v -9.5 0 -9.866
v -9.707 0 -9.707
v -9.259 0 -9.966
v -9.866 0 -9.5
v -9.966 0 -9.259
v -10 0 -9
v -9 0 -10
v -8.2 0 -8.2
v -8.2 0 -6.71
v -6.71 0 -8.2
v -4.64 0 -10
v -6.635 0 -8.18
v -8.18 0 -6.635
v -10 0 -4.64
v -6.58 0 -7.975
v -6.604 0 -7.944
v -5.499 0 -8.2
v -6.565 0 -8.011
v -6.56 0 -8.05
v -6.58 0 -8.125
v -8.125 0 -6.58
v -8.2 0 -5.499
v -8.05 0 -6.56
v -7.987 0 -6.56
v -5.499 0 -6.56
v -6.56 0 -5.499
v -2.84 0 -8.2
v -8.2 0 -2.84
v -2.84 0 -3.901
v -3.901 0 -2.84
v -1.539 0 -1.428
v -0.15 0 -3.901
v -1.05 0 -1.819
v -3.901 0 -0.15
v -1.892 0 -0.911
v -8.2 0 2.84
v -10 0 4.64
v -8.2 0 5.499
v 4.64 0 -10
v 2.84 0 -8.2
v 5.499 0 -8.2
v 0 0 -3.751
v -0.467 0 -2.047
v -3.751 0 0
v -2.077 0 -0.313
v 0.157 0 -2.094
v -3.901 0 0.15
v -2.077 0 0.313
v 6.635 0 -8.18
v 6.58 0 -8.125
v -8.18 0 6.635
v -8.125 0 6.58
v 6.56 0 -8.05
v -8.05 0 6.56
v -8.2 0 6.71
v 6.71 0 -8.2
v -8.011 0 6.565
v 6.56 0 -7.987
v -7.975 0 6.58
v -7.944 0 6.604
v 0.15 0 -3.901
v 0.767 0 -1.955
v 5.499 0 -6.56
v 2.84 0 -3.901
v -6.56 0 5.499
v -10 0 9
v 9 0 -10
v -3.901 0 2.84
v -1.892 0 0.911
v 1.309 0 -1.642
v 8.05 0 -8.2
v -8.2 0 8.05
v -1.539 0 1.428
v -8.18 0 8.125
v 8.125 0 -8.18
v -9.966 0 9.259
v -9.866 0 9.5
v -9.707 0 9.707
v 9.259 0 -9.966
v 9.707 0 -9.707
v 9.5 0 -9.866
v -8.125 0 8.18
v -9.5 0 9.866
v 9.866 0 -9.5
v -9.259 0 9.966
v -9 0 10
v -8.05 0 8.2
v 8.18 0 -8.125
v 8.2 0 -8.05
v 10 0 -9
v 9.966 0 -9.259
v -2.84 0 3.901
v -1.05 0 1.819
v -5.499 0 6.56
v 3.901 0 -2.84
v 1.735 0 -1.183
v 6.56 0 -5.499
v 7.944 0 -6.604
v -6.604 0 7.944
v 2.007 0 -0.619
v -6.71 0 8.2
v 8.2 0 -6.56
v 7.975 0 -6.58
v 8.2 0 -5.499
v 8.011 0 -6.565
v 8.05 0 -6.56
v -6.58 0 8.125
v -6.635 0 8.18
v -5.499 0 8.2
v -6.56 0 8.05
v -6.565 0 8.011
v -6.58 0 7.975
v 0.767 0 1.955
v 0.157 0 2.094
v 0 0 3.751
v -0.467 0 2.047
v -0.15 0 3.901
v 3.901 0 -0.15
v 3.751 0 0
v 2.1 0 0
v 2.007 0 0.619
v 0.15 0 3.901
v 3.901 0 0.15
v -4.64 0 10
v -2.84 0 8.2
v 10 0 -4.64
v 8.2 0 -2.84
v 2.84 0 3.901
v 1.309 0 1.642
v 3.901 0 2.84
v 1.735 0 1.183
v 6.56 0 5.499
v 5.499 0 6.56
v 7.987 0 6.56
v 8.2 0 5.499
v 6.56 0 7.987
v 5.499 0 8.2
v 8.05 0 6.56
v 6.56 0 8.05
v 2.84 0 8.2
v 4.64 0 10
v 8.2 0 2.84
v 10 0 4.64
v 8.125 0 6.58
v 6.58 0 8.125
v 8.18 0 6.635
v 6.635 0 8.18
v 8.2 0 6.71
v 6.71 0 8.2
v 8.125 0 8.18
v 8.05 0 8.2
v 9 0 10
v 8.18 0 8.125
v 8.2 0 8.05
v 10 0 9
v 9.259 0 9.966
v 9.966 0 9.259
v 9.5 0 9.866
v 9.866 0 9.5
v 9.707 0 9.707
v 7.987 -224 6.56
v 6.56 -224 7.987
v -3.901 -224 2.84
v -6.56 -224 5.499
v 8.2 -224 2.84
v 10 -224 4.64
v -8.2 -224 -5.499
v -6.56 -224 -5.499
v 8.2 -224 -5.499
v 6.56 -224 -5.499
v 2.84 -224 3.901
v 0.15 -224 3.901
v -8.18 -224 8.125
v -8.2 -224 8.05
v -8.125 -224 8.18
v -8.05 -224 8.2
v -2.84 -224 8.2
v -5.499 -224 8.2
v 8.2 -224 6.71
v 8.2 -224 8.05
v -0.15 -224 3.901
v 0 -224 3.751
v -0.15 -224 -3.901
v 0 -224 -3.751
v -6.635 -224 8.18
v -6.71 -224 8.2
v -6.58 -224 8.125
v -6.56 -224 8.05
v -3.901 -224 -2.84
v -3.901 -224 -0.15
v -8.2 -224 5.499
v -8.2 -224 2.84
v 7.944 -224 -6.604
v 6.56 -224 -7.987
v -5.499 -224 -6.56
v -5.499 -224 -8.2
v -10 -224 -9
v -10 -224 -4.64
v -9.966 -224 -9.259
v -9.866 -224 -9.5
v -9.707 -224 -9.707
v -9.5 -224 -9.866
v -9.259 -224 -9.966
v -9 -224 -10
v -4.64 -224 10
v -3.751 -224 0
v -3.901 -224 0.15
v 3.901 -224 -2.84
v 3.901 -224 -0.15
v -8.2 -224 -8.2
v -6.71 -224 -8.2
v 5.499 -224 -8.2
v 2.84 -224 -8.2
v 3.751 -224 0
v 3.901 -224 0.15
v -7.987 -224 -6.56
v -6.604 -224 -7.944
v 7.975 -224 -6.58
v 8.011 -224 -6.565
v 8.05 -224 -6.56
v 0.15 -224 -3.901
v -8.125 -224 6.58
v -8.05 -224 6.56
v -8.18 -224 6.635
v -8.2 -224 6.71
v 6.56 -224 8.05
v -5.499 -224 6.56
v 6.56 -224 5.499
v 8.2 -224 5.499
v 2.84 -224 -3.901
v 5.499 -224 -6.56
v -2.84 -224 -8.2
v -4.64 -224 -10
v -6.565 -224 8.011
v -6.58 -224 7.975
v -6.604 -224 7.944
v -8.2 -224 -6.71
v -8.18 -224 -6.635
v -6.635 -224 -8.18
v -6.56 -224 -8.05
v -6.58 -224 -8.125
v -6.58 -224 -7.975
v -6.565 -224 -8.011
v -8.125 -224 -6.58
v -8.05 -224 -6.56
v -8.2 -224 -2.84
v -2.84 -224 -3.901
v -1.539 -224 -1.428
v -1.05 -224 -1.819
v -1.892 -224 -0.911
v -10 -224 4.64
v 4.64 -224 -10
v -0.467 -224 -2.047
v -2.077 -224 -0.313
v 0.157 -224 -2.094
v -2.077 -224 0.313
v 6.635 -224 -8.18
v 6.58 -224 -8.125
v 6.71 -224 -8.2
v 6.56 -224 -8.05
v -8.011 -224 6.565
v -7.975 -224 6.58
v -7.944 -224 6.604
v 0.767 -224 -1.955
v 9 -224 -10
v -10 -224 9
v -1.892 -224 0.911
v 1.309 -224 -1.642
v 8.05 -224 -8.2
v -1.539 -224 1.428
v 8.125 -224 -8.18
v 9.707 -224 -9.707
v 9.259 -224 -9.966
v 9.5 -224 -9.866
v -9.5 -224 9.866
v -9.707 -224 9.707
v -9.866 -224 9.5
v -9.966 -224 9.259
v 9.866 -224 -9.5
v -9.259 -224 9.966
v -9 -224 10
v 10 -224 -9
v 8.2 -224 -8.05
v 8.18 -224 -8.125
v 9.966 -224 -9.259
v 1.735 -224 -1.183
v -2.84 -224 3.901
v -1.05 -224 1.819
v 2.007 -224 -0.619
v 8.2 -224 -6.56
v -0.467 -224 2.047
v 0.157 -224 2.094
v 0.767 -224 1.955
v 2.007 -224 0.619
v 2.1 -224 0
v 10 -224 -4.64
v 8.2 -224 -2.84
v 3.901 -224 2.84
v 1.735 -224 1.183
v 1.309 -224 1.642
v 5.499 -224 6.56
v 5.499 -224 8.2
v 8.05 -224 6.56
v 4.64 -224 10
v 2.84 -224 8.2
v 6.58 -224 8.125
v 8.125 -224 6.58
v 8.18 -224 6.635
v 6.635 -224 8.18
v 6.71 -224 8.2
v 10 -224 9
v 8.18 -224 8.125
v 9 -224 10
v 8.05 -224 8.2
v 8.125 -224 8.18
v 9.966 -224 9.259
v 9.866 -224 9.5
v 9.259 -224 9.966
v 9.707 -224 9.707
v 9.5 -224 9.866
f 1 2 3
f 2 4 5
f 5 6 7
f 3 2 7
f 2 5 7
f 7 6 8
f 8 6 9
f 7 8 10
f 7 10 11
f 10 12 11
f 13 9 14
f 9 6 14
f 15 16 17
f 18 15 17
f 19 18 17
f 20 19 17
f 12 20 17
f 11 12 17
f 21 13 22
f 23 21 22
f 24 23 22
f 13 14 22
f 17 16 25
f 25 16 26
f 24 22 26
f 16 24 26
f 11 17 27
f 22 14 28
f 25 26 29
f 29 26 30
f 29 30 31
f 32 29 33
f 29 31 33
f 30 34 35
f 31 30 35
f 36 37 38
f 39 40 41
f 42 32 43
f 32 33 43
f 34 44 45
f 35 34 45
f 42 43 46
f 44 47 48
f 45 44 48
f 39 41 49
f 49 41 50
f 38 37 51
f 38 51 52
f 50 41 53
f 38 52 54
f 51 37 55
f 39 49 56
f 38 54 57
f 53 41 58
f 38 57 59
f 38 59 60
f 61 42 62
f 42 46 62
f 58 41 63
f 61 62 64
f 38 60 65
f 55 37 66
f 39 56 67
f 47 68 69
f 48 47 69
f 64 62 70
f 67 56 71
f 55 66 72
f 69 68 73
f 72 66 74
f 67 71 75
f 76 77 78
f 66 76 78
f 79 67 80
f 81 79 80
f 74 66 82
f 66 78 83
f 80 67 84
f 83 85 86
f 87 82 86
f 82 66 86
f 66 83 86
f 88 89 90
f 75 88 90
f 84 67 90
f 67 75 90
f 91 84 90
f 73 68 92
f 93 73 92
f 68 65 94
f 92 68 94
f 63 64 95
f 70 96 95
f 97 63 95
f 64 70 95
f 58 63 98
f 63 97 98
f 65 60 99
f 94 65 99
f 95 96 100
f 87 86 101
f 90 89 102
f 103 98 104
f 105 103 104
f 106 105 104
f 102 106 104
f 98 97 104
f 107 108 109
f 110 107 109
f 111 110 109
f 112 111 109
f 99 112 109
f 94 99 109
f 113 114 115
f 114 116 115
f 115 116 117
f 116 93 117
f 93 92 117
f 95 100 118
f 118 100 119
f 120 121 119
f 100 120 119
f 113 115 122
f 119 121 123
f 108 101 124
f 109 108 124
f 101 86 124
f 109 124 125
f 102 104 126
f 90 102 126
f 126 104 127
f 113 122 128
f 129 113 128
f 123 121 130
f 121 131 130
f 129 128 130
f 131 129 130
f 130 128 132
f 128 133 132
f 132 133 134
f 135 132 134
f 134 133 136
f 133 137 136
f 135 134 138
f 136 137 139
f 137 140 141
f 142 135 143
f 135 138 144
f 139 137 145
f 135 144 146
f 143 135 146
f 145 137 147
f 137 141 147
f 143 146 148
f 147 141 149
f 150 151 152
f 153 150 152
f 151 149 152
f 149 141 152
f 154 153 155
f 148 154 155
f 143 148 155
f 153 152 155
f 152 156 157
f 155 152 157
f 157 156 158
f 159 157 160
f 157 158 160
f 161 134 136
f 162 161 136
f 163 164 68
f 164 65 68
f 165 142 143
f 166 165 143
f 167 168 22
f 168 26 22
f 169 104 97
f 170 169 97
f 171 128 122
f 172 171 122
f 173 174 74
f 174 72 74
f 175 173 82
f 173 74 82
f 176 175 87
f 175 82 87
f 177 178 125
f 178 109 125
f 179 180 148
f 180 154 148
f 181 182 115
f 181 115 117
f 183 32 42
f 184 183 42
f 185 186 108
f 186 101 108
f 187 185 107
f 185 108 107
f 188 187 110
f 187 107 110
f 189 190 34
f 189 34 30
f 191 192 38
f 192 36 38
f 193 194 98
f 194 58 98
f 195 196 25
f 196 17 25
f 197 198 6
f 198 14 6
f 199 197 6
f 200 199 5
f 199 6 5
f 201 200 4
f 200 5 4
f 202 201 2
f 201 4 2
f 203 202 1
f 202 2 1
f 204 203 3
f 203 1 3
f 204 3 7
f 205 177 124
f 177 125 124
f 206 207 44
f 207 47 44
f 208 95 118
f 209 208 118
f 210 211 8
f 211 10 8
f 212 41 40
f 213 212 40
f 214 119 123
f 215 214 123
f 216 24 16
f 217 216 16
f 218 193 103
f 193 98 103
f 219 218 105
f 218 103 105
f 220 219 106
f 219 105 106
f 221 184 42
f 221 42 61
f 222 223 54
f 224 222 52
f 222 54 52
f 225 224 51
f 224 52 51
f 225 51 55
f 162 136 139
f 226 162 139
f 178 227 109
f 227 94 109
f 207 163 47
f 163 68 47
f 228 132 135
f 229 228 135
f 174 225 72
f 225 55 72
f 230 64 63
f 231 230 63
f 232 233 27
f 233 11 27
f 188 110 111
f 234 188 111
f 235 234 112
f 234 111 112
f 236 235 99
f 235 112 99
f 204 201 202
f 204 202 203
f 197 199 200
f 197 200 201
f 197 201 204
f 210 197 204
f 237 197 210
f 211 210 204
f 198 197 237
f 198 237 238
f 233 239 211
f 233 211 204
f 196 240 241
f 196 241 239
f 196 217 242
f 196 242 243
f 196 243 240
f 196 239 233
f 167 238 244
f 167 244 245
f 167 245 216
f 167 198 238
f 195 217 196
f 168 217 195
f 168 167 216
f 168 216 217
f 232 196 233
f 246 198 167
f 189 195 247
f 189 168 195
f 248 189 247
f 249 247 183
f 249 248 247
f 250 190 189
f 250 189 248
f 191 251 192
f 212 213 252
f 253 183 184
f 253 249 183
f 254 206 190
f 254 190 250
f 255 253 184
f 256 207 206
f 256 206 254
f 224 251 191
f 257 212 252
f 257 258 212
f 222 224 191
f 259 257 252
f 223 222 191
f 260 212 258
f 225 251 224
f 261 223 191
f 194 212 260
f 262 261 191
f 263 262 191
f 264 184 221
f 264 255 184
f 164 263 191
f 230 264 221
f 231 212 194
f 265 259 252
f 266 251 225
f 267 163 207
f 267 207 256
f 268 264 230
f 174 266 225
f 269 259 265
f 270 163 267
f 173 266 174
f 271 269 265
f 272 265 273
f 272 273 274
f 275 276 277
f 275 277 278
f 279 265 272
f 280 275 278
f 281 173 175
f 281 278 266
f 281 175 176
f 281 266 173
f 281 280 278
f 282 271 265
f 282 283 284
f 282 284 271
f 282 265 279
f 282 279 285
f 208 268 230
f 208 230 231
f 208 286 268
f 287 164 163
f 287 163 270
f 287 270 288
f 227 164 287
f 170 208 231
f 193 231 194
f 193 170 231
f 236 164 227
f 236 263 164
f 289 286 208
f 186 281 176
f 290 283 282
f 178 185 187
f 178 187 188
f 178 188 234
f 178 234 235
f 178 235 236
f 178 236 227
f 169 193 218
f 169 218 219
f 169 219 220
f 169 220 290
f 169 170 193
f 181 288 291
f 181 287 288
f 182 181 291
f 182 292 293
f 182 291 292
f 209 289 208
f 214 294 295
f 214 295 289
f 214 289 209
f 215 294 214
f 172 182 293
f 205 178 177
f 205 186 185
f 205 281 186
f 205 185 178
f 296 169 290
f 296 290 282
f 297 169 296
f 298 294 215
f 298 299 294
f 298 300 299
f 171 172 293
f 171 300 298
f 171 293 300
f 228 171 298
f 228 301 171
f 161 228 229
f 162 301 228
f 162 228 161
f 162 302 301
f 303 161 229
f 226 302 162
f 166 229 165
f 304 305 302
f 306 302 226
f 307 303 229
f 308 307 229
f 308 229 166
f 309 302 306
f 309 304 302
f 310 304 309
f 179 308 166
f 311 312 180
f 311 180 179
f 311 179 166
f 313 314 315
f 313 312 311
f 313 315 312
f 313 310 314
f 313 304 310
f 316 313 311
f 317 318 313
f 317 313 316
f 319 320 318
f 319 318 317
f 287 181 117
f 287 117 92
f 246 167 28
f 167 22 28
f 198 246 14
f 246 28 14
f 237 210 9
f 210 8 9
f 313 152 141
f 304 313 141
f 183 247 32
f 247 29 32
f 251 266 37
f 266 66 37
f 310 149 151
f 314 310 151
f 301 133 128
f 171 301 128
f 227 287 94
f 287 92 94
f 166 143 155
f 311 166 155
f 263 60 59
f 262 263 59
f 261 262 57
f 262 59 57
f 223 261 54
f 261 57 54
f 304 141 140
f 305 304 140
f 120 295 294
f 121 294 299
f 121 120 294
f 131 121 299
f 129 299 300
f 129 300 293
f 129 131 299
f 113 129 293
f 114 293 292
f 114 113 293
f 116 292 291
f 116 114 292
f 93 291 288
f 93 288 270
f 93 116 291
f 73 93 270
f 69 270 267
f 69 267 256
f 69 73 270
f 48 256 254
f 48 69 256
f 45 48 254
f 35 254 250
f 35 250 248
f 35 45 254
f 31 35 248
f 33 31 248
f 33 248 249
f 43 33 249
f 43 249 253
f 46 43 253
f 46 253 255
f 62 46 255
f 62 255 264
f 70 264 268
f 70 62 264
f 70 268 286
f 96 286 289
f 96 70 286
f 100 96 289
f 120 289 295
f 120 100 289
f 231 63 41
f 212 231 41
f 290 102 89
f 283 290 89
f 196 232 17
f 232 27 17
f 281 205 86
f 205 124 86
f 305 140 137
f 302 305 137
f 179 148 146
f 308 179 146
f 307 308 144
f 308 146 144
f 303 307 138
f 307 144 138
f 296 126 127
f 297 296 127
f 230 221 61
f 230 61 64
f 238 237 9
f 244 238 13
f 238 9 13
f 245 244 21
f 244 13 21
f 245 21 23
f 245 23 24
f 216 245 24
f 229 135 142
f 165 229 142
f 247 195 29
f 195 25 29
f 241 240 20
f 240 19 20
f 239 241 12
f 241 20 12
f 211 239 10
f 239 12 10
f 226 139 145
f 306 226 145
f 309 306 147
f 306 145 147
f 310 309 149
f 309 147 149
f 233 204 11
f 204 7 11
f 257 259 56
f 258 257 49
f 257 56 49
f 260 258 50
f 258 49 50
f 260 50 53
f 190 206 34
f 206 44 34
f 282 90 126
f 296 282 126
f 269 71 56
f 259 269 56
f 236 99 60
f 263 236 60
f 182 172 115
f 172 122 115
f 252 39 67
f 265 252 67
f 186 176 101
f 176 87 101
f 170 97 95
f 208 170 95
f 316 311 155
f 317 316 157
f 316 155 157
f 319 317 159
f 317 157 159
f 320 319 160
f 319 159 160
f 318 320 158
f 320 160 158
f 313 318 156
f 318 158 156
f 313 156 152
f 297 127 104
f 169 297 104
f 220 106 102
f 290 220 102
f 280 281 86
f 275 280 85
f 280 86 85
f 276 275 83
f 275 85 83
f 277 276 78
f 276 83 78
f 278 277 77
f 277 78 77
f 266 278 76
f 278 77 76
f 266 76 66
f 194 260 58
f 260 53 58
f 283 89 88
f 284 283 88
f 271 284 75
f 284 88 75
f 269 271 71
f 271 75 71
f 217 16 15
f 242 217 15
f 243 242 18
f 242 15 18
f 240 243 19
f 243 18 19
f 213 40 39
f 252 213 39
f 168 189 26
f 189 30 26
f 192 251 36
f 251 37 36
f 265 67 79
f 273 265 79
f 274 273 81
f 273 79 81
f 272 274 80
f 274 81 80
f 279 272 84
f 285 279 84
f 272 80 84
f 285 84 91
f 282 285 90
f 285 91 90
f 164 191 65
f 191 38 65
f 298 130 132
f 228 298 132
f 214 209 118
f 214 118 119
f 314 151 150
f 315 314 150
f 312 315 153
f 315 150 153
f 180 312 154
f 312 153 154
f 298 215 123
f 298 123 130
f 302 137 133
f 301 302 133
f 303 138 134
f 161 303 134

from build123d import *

# Parameters (mm, degrees)
F0_R      = 2.1
F1_DEPTH  = 20
F1_FACE_R = 2.1
F2_DEPTH  = 204


with BuildPart() as f1:
    # F0 (on Front) → F1 (new body)
    with BuildSketch(Plane.XZ):
        with BuildLine():
            Line((-4.64, 10), (-9, 10))
            ThreePointArc((-9, 10), (-9.707107, 9.707107), (-10, 9))
            Line((-10, 9), (-10, 4.64))
            Line((-10, 4.64), (-8.2, 2.84))
            Line((-8.2, 2.84), (-8.2, 5.49934))
            Line((-8.2, 5.49934), (-6.56, 5.49934))
            Line((-6.56, 5.49934), (-3.90066, 2.84))
            Line((-3.90066, 2.84), (-3.90066, 0.15))
            Line((-3.90066, 0.15), (-3.75066, 0))
            Line((-3.75066, 0), (-3.90066, -0.15))
            Line((-3.90066, -0.15), (-3.90066, -2.84))
            Line((-3.90066, -2.84), (-6.56, -5.49934))
            Line((-6.56, -5.49934), (-8.2, -5.49934))
            Line((-8.2, -5.49934), (-8.2, -2.84))
            Line((-8.2, -2.84), (-10, -4.64))
            Line((-10, -4.64), (-10, -9))
            ThreePointArc((-10, -9), (-9.707107, -9.707107), (-9, -10))
            Line((-9, -10), (-4.64, -10))
            Line((-4.64, -10), (-2.84, -8.2))
            Line((-2.84, -8.2), (-5.49934, -8.2))
            Line((-5.49934, -8.2), (-5.49934, -6.56))
            Line((-5.49934, -6.56), (-2.84, -3.90066))
            Line((-2.84, -3.90066), (-0.15, -3.90066))
            Line((-0.15, -3.90066), (0, -3.75066))
            Line((0, -3.75066), (0.15, -3.90066))
            Line((0.15, -3.90066), (2.84, -3.90066))
            Line((2.84, -3.90066), (5.49934, -6.56))
            Line((5.49934, -6.56), (5.49934, -8.2))
            Line((5.49934, -8.2), (2.84, -8.2))
            Line((2.84, -8.2), (4.64, -10))
            Line((4.64, -10), (9, -10))
            ThreePointArc((9, -10), (9.707107, -9.707107), (10, -9))
            Line((10, -9), (10, -4.64))
            Line((10, -4.64), (8.2, -2.84))
            Line((8.2, -2.84), (8.2, -5.49934))
            Line((8.2, -5.49934), (6.56, -5.49934))
            Line((6.56, -5.49934), (3.90066, -2.84))
            Line((3.90066, -2.84), (3.90066, -0.15))
            Line((3.90066, -0.15), (3.75066, 0))
            Line((3.75066, 0), (3.90066, 0.15))
            Line((3.90066, 0.15), (3.90066, 2.84))
            Line((3.90066, 2.84), (6.56, 5.49934))
            Line((6.56, 5.49934), (8.2, 5.49934))
            Line((8.2, 5.49934), (8.2, 2.84))
            Line((8.2, 2.84), (10, 4.64))
            Line((10, 4.64), (10, 9))
            ThreePointArc((10, 9), (9.707107, 9.707107), (9, 10))
            Line((9, 10), (4.64, 10))
            Line((4.64, 10), (2.84, 8.2))
            Line((2.84, 8.2), (5.49934, 8.2))
            Line((5.49934, 8.2), (5.49934, 6.56))
            Line((5.49934, 6.56), (2.84, 3.90066))
            Line((2.84, 3.90066), (0.15, 3.90066))
            Line((0.15, 3.90066), (0, 3.75066))
            Line((0, 3.75066), (-0.15, 3.90066))
            Line((-0.15, 3.90066), (-2.84, 3.90066))
            Line((-2.84, 3.90066), (-5.49934, 6.56))
            Line((-5.49934, 6.56), (-5.49934, 8.2))
            Line((-5.49934, 8.2), (-2.84, 8.2))
            Line((-2.84, 8.2), (-4.64, 10))
        make_face()
        with BuildLine():
            Line((-8.2, -8.2), (-8.2, -6.71))
            ThreePointArc((-8.2, -6.71), (-8.156066, -6.603934), (-8.05, -6.56))
            Line((-8.05, -6.56), (-7.98749, -6.56))
            Line((-7.98749, -6.56), (-6.603934, -7.943556))
            ThreePointArc((-6.603934, -7.943556), (-6.571418, -7.992219), (-6.56, -8.049622))
            Line((-6.56, -8.049622), (-6.56, -8.05))
            ThreePointArc((-6.56, -8.05), (-6.603934, -8.156066), (-6.71, -8.2))
            Line((-6.71, -8.2), (-8.2, -8.2))
        make_face(mode=Mode.SUBTRACT)
        with BuildLine():
            ThreePointArc((6.71, -8.2), (6.603934, -8.156066), (6.56, -8.05))
            Line((6.56, -8.05), (6.56, -7.98749))
            Line((6.56, -7.98749), (7.943556, -6.603934))
            ThreePointArc((7.943556, -6.603934), (7.992219, -6.571418), (8.049622, -6.56))
            Line((8.049622, -6.56), (8.2, -6.56))
            Line((8.2, -6.56), (8.2, -8.05))
            ThreePointArc((8.2, -8.05), (8.156066, -8.156066), (8.05, -8.2))
            Line((8.05, -8.2), (6.71, -8.2))
        make_face(mode=Mode.SUBTRACT)
        with BuildLine():
            ThreePointArc((-8.2, 8.05), (-8.156066, 8.156066), (-8.05, 8.2))
            Line((-8.05, 8.2), (-6.71, 8.2))
            ThreePointArc((-6.71, 8.2), (-6.603934, 8.156066), (-6.56, 8.05))
            Line((-6.56, 8.05), (-6.56, 8.049622))
            ThreePointArc((-6.56, 8.049622), (-6.571418, 7.992219), (-6.603934, 7.943556))
            Line((-6.603934, 7.943556), (-7.943556, 6.603934))
            ThreePointArc((-7.943556, 6.603934), (-7.992219, 6.571418), (-8.049622, 6.56))
            Line((-8.049622, 6.56), (-8.05, 6.56))
            ThreePointArc((-8.05, 6.56), (-8.156066, 6.603934), (-8.2, 6.71))
            Line((-8.2, 6.71), (-8.2, 8.05))
        make_face(mode=Mode.SUBTRACT)
        Circle(F0_R, mode=Mode.SUBTRACT)
        with BuildLine():
            Line((8.2, 8.05), (8.2, 6.71))
            ThreePointArc((8.2, 6.71), (8.156066, 6.603934), (8.05, 6.56))
            Line((8.05, 6.56), (7.98749, 6.56))
            Line((7.98749, 6.56), (6.56, 7.98749))
            Line((6.56, 7.98749), (6.56, 8.05))
            ThreePointArc((6.56, 8.05), (6.603934, 8.156066), (6.71, 8.2))
            Line((6.71, 8.2), (8.05, 8.2))
            ThreePointArc((8.05, 8.2), (8.156066, 8.156066), (8.2, 8.05))
        make_face(mode=Mode.SUBTRACT)
    extrude(amount=F1_DEPTH)

    # F1_face (on face) → F2 (join)
    with BuildSketch(Plane(origin=(-3.9e-05, -20, 0.000435), x_dir=(1, 0, 0), z_dir=(0, -1, 0))):
        with BuildLine():
            Line((2.840039, 3.900225), (0.150039, 3.900225))
            Line((0.150039, 3.900225), (3.9e-05, 3.750225))
            Line((3.9e-05, 3.750225), (-0.149961, 3.900225))
            Line((-0.149961, 3.900225), (-2.839961, 3.900225))
            Line((-2.839961, 3.900225), (-5.499301, 6.559565))
            Line((-5.499301, 6.559565), (-5.499301, 8.199565))
            Line((-5.499301, 8.199565), (-2.839961, 8.199565))
            Line((-2.839961, 8.199565), (-4.639961, 9.999565))
            Line((-4.639961, 9.999565), (-8.999961, 9.999565))
            ThreePointArc((-8.999961, 9.999565), (-9.707068, 9.706672), (-9.999961, 8.999565))
            Line((-9.999961, 8.999565), (-9.999961, 4.639565))
            Line((-9.999961, 4.639565), (-8.199961, 2.839565))
            Line((-8.199961, 2.839565), (-8.199961, 5.498905))
            Line((-8.199961, 5.498905), (-6.559961, 5.498905))
            Line((-6.559961, 5.498905), (-3.900621, 2.839565))
            Line((-3.900621, 2.839565), (-3.900621, 0.149565))
            Line((-3.900621, 0.149565), (-3.750621, -0.000435))
            Line((-3.750621, -0.000435), (-3.900621, -0.150435))
            Line((-3.900621, -0.150435), (-3.900621, -2.840435))
            Line((-3.900621, -2.840435), (-6.559961, -5.499775))
            Line((-6.559961, -5.499775), (-8.199961, -5.499775))
            Line((-8.199961, -5.499775), (-8.199961, -2.840435))
            Line((-8.199961, -2.840435), (-9.999961, -4.640435))
            Line((-9.999961, -4.640435), (-9.999961, -9.000435))
            ThreePointArc((-9.999961, -9.000435), (-9.707068, -9.707542), (-8.999961, -10.000435))
            Line((-8.999961, -10.000435), (-4.639961, -10.000435))
            Line((-4.639961, -10.000435), (-2.839961, -8.200435))
            Line((-2.839961, -8.200435), (-5.499301, -8.200435))
            Line((-5.499301, -8.200435), (-5.499301, -6.560435))
            Line((-5.499301, -6.560435), (-2.839961, -3.901095))
            Line((-2.839961, -3.901095), (-0.149961, -3.901095))
            Line((-0.149961, -3.901095), (3.9e-05, -3.751095))
            Line((3.9e-05, -3.751095), (0.150039, -3.901095))
            Line((0.150039, -3.901095), (2.840039, -3.901095))
            Line((2.840039, -3.901095), (5.499379, -6.560435))
            Line((5.499379, -6.560435), (5.499379, -8.200435))
            Line((5.499379, -8.200435), (2.840039, -8.200435))
            Line((2.840039, -8.200435), (4.640039, -10.000435))
            Line((4.640039, -10.000435), (9.000039, -10.000435))
            ThreePointArc((9.000039, -10.000435), (9.707146, -9.707542), (10.000039, -9.000435))
            Line((10.000039, -9.000435), (10.000039, -4.640435))
            Line((10.000039, -4.640435), (8.200039, -2.840435))
            Line((8.200039, -2.840435), (8.200039, -5.499775))
            Line((8.200039, -5.499775), (6.560039, -5.499775))
            Line((6.560039, -5.499775), (3.900699, -2.840435))
            Line((3.900699, -2.840435), (3.900699, -0.150435))
            Line((3.900699, -0.150435), (3.750699, -0.000435))
            Line((3.750699, -0.000435), (3.900699, 0.149565))
            Line((3.900699, 0.149565), (3.900699, 2.839565))
            Line((3.900699, 2.839565), (6.560039, 5.498905))
            Line((6.560039, 5.498905), (8.200039, 5.498905))
            Line((8.200039, 5.498905), (8.200039, 2.839565))
            Line((8.200039, 2.839565), (10.000039, 4.639565))
            Line((10.000039, 4.639565), (10.000039, 8.999565))
            ThreePointArc((10.000039, 8.999565), (9.707146, 9.706672), (9.000039, 9.999565))
            Line((9.000039, 9.999565), (4.640039, 9.999565))
            Line((4.640039, 9.999565), (2.840039, 8.199565))
            Line((2.840039, 8.199565), (5.499379, 8.199565))
            Line((5.499379, 8.199565), (5.499379, 6.559565))
            Line((5.499379, 6.559565), (2.840039, 3.900225))
        make_face()
        with BuildLine():
            ThreePointArc((-6.559961, -8.050435), (-6.603895, -8.156501), (-6.709961, -8.200435))
            Line((-6.709961, -8.200435), (-8.199961, -8.200435))
            Line((-8.199961, -8.200435), (-8.199961, -6.710435))
            ThreePointArc((-8.199961, -6.710435), (-8.156027, -6.604369), (-8.049961, -6.560435))
            Line((-8.049961, -6.560435), (-7.987451, -6.560435))
            Line((-7.987451, -6.560435), (-6.603895, -7.943991))
            ThreePointArc((-6.603895, -7.943991), (-6.571379, -7.992654), (-6.559961, -8.050057))
            Line((-6.559961, -8.050057), (-6.559961, -8.050435))
        make_face(mode=Mode.SUBTRACT)
        with BuildLine():
            ThreePointArc((6.710039, -8.200435), (6.603973, -8.156501), (6.560039, -8.050435))
            Line((6.560039, -8.050435), (6.560039, -7.987925))
            Line((6.560039, -7.987925), (7.943595, -6.604369))
            ThreePointArc((7.943595, -6.604369), (7.992258, -6.571853), (8.049661, -6.560435))
            Line((8.049661, -6.560435), (8.200039, -6.560435))
            Line((8.200039, -6.560435), (8.200039, -8.050435))
            ThreePointArc((8.200039, -8.050435), (8.156105, -8.156501), (8.050039, -8.200435))
            Line((8.050039, -8.200435), (6.710039, -8.200435))
        make_face(mode=Mode.SUBTRACT)
        with BuildLine():
            ThreePointArc((-8.049961, 6.559565), (-8.156027, 6.603499), (-8.199961, 6.709565))
            Line((-8.199961, 6.709565), (-8.199961, 8.049565))
            ThreePointArc((-8.199961, 8.049565), (-8.156027, 8.155631), (-8.049961, 8.199565))
            Line((-8.049961, 8.199565), (-6.709961, 8.199565))
            ThreePointArc((-6.709961, 8.199565), (-6.603895, 8.155631), (-6.559961, 8.049565))
            Line((-6.559961, 8.049565), (-6.559961, 8.049187))
            ThreePointArc((-6.559961, 8.049187), (-6.571379, 7.991784), (-6.603895, 7.943121))
            Line((-6.603895, 7.943121), (-7.943517, 6.603499))
            ThreePointArc((-7.943517, 6.603499), (-7.99218, 6.570983), (-8.049583, 6.559565))
            Line((-8.049583, 6.559565), (-8.049961, 6.559565))
        make_face(mode=Mode.SUBTRACT)
        with Locations((3.9e-05, -0.000435)):
            Circle(F1_FACE_R, mode=Mode.SUBTRACT)
        with BuildLine():
            Line((8.200039, 8.049565), (8.200039, 6.709565))
            ThreePointArc((8.200039, 6.709565), (8.156105, 6.603499), (8.050039, 6.559565))
            Line((8.050039, 6.559565), (7.987529, 6.559565))
            Line((7.987529, 6.559565), (6.560039, 7.987055))
            Line((6.560039, 7.987055), (6.560039, 8.049565))
            ThreePointArc((6.560039, 8.049565), (6.603973, 8.155631), (6.710039, 8.199565))
            Line((6.710039, 8.199565), (8.050039, 8.199565))
            ThreePointArc((8.050039, 8.199565), (8.156105, 8.155631), (8.200039, 8.049565))
        make_face(mode=Mode.SUBTRACT)
    extrude(amount=F2_DEPTH)


solid = f1.part
